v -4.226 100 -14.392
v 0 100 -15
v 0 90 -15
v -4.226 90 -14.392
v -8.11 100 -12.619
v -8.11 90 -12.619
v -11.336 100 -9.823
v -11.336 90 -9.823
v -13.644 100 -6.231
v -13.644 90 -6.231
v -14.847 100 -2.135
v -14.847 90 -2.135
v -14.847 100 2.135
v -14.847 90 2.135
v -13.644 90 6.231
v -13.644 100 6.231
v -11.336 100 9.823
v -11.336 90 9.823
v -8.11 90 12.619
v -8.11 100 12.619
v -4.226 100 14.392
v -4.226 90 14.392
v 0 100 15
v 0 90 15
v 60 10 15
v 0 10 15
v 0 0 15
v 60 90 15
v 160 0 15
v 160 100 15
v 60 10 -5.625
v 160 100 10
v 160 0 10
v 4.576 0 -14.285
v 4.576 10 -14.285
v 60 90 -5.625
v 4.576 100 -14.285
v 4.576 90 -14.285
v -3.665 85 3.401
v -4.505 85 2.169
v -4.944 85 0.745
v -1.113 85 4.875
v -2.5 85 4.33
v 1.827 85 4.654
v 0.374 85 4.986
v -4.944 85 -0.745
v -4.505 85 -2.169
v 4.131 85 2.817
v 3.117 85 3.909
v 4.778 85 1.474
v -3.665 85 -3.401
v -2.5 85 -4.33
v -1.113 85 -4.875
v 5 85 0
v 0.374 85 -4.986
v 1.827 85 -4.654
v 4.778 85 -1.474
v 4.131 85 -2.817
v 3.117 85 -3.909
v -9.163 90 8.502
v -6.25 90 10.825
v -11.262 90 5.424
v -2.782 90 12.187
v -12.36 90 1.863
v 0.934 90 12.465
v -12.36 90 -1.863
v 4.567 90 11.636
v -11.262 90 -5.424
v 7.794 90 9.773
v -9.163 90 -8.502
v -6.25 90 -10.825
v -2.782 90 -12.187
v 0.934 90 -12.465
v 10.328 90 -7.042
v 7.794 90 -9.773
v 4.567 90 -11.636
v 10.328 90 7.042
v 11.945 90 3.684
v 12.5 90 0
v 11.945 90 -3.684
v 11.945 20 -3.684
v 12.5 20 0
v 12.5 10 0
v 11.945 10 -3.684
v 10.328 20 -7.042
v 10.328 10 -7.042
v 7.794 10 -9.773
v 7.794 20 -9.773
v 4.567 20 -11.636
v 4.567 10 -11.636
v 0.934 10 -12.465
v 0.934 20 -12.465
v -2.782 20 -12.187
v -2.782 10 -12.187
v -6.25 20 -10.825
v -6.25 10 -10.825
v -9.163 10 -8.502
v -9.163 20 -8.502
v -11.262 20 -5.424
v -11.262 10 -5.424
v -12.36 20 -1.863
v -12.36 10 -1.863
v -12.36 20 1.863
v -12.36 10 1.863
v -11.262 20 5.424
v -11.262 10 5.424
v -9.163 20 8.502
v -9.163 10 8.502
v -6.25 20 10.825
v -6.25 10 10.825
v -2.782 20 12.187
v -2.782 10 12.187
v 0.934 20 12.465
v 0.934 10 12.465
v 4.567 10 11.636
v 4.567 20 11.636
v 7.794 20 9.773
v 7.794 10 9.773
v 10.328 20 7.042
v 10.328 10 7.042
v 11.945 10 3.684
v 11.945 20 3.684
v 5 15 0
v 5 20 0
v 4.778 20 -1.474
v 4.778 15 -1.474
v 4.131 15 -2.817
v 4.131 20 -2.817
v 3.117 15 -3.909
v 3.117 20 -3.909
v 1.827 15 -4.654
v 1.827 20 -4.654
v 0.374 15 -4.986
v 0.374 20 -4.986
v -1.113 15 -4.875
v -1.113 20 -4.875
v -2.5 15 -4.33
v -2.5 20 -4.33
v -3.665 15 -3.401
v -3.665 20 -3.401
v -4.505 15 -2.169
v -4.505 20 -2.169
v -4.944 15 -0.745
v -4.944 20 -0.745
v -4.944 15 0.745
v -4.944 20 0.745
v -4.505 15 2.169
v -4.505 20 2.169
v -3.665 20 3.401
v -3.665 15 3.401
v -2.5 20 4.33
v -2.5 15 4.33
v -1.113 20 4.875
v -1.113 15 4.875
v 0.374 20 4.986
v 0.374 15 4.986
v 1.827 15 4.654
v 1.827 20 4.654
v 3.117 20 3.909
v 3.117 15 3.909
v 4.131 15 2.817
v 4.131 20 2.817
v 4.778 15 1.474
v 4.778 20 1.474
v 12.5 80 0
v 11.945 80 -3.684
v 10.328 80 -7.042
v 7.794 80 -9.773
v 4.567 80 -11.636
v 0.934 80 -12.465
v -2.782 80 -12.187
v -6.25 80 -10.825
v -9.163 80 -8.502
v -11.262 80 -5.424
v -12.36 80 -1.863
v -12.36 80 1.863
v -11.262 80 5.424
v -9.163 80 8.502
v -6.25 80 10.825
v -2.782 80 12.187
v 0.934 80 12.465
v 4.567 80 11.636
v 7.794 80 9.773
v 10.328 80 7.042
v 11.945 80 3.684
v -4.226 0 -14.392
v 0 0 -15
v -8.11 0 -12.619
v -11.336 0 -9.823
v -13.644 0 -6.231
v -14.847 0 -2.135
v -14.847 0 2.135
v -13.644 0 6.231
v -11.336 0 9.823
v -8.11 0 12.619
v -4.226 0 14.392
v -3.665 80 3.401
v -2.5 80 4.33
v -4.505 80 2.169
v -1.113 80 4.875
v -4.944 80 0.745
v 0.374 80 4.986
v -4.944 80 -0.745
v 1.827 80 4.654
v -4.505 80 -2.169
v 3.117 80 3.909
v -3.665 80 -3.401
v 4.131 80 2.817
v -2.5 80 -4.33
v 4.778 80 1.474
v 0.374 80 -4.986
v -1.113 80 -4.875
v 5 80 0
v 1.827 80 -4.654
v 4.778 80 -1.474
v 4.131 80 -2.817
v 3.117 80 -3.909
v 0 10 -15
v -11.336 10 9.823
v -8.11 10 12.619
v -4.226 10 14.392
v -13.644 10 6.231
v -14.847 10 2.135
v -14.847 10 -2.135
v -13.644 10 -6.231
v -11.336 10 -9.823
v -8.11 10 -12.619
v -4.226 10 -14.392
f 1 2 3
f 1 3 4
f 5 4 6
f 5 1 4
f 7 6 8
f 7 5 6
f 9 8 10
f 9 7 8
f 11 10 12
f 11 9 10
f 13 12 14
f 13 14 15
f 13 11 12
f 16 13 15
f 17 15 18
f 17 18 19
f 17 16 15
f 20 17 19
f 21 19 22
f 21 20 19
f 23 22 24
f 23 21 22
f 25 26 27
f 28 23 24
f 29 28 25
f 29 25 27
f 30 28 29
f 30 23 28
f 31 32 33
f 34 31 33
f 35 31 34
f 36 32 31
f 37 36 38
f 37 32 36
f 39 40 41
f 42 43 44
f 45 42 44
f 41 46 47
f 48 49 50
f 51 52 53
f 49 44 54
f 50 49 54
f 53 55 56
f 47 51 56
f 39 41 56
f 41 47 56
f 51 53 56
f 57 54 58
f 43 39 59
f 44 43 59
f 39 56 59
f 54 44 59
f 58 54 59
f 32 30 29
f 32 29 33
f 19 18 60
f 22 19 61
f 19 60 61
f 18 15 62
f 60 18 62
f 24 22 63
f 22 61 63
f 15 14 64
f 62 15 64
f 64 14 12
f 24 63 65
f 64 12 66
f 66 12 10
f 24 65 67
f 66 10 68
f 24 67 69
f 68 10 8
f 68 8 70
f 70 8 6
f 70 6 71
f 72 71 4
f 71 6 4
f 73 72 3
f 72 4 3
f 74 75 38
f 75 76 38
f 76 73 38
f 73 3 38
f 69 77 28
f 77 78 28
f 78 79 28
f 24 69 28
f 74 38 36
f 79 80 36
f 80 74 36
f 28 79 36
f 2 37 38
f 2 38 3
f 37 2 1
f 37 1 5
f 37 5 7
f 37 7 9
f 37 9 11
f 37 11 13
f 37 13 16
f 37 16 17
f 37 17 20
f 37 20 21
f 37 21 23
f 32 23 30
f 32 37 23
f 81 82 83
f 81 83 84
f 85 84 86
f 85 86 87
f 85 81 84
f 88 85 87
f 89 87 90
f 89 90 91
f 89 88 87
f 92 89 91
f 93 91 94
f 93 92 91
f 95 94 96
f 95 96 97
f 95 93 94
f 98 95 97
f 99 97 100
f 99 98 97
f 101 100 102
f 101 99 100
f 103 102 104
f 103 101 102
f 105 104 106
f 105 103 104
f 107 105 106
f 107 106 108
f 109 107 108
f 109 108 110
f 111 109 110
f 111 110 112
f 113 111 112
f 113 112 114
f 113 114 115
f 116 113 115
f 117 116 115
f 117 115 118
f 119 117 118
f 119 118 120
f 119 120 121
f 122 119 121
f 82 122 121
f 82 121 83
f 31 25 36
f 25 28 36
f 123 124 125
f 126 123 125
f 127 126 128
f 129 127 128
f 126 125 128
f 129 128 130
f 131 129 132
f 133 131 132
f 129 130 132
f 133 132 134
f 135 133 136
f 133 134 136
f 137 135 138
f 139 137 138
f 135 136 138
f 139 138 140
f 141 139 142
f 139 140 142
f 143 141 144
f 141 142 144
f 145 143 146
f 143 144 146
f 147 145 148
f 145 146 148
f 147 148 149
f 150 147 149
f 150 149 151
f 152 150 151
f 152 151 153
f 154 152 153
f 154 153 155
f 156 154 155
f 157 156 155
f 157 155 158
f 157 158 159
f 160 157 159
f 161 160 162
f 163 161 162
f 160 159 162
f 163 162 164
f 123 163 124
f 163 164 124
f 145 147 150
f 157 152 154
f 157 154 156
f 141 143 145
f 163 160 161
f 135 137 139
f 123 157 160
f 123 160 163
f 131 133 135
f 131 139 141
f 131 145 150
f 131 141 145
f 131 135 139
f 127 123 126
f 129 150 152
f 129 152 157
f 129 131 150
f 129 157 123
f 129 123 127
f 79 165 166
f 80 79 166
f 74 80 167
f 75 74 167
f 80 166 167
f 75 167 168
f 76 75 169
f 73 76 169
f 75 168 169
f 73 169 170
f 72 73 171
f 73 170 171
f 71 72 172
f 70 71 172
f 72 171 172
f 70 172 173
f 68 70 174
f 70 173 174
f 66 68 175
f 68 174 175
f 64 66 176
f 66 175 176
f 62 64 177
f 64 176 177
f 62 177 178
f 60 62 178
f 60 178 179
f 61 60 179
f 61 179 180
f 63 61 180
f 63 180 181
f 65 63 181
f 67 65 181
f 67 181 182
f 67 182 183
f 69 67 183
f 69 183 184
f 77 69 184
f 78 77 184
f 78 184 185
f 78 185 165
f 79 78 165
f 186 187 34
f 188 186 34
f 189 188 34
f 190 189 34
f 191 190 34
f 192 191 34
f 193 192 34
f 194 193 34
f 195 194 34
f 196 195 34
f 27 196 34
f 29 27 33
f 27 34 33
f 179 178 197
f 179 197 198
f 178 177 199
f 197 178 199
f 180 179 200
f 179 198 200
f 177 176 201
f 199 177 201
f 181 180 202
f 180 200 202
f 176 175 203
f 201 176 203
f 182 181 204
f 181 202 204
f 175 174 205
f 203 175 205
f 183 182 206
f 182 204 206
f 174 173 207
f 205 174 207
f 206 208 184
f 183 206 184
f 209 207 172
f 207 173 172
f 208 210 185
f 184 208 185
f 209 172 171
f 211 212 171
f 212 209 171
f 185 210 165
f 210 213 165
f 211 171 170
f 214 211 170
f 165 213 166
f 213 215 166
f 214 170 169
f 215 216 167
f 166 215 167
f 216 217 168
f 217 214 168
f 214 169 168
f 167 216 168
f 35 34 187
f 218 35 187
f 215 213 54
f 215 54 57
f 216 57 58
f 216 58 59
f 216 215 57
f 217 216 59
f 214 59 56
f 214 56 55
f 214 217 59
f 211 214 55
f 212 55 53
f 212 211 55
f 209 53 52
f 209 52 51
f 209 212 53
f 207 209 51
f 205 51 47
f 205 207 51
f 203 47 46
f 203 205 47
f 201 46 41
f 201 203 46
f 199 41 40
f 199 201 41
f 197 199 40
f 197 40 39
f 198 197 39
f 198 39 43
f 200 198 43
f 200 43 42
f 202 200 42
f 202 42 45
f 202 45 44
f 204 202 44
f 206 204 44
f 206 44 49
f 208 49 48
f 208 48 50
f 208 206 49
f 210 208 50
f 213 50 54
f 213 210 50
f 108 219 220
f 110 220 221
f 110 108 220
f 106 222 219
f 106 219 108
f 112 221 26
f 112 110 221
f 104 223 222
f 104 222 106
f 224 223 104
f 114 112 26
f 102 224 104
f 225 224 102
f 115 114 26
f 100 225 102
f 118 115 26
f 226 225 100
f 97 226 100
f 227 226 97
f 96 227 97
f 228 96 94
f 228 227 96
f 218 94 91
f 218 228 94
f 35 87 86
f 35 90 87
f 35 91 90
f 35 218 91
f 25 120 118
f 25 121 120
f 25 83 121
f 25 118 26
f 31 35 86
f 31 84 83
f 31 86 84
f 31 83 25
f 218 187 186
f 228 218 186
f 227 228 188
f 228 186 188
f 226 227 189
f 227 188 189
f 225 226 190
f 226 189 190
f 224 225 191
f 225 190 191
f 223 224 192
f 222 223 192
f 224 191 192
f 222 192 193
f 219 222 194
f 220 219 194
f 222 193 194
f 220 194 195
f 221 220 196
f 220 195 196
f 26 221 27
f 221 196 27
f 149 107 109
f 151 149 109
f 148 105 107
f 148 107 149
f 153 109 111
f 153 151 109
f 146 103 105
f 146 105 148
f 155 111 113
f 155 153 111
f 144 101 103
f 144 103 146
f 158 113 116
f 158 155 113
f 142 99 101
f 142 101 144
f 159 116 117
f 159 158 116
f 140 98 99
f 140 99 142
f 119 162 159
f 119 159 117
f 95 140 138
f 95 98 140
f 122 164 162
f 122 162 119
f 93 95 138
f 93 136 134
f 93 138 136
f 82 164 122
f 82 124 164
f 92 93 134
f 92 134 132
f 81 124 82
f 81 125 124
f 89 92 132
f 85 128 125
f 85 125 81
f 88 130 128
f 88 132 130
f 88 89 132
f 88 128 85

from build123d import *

# Parameters (mm, degrees)
BOSS_EXTRUDE1_DEPTH = 50
SKETCH2_R           = 12.5
CUT_EXTRUDE1_DEPTH  = 40
SKETCH3_R           = 12.5
CUT_EXTRUDE2_DEPTH  = 30
SKETCH4_R           = 5
CUT_EXTRUDE3_DEPTH  = 5


with BuildPart() as part:
    # Sketch1 → Boss-Extrude1 (new body)
    with BuildSketch(Plane(origin=(0, 0, 0), x_dir=(1, 0, 0), z_dir=(0, 1, 0))):
        with BuildLine():
            Line((0, -15), (0, 15))
            ThreePointArc((0, 15), (-15, 0), (0, -15))
        make_face()
        with BuildLine():
            Line((4.575786463, 14.285033365), (0, 15))
            Line((0, 15), (0, -15))
            ThreePointArc((0, -15), (10.606601718, -10.606601718), (15, 0))
            ThreePointArc((15, 0), (12.116864218, 8.842036051), (4.575786463, 14.285033365))
        make_face()
        with BuildLine():
            Line((160, -10), (4.575786463, 14.285033365))
            ThreePointArc((4.575786463, 14.285033365), (12.116864218, 8.842036051), (15, 0))
            ThreePointArc((15, 0), (10.606601718, -10.606601718), (0, -15))
            Line((0, -15), (160, -15))
            Line((160, -15), (160, -10))
        make_face()
    boss_extrude1 = extrude(amount=BOSS_EXTRUDE1_DEPTH)

    # Sketch2 → Cut-Extrude1 (cut)
    with BuildSketch(Plane(origin=(0, 50, 0), x_dir=(1, 0, 0), z_dir=(0, 1, 0))):
        with BuildLine():
            ThreePointArc((15, 0), (10.606601718, -10.606601718), (0, -15))
            Line((0, -15), (60, -15))
            Line((60, -15), (60, 5.625))
            Line((60, 5.625), (4.575786463, 14.285033365))
            ThreePointArc((4.575786463, 14.285033365), (12.116864218, 8.842036051), (15, 0))
        make_face()
        with BuildLine():
            ThreePointArc((0, 15), (-15, 0), (0, -15))
            ThreePointArc((0, -15), (10.606601718, -10.606601718), (15, 0))
            ThreePointArc((15, 0), (12.116864218, 8.842036051), (4.575786463, 14.285033365))
            Line((4.575786463, 14.285033365), (0, 15))
        make_face()
        Circle(SKETCH2_R, mode=Mode.SUBTRACT)
    cut_extrude1 = extrude(amount=-CUT_EXTRUDE1_DEPTH, mode=Mode.SUBTRACT)

    # Sketch3 → Cut-Extrude2 (cut)
    with BuildSketch(Plane(origin=(0, 50, 0), x_dir=(1, 0, 0), z_dir=(0, 1, 0))):
        Circle(SKETCH3_R)
    cut_extrude2 = extrude(amount=-CUT_EXTRUDE2_DEPTH, mode=Mode.SUBTRACT)

    # Sketch4 → Cut-Extrude3 (cut)
    with BuildSketch(Plane(origin=(0, 20, 0), x_dir=(1, 0, 0), z_dir=(0, 1, 0))):
        Circle(SKETCH4_R)
    cut_extrude3 = extrude(amount=-CUT_EXTRUDE3_DEPTH, mode=Mode.SUBTRACT)

    # Mirror1: Boss-Extrude1, Cut-Extrude1, Cut-Extrude2, Cut-Extrude3 across plane
    add(boss_extrude1.mirror(Plane.ZX.offset(50)))
    add(cut_extrude1.mirror(Plane.ZX.offset(50)), mode=Mode.SUBTRACT)
    add(cut_extrude2.mirror(Plane.ZX.offset(50)), mode=Mode.SUBTRACT)
    add(cut_extrude3.mirror(Plane.ZX.offset(50)), mode=Mode.SUBTRACT)


solid = part.part
